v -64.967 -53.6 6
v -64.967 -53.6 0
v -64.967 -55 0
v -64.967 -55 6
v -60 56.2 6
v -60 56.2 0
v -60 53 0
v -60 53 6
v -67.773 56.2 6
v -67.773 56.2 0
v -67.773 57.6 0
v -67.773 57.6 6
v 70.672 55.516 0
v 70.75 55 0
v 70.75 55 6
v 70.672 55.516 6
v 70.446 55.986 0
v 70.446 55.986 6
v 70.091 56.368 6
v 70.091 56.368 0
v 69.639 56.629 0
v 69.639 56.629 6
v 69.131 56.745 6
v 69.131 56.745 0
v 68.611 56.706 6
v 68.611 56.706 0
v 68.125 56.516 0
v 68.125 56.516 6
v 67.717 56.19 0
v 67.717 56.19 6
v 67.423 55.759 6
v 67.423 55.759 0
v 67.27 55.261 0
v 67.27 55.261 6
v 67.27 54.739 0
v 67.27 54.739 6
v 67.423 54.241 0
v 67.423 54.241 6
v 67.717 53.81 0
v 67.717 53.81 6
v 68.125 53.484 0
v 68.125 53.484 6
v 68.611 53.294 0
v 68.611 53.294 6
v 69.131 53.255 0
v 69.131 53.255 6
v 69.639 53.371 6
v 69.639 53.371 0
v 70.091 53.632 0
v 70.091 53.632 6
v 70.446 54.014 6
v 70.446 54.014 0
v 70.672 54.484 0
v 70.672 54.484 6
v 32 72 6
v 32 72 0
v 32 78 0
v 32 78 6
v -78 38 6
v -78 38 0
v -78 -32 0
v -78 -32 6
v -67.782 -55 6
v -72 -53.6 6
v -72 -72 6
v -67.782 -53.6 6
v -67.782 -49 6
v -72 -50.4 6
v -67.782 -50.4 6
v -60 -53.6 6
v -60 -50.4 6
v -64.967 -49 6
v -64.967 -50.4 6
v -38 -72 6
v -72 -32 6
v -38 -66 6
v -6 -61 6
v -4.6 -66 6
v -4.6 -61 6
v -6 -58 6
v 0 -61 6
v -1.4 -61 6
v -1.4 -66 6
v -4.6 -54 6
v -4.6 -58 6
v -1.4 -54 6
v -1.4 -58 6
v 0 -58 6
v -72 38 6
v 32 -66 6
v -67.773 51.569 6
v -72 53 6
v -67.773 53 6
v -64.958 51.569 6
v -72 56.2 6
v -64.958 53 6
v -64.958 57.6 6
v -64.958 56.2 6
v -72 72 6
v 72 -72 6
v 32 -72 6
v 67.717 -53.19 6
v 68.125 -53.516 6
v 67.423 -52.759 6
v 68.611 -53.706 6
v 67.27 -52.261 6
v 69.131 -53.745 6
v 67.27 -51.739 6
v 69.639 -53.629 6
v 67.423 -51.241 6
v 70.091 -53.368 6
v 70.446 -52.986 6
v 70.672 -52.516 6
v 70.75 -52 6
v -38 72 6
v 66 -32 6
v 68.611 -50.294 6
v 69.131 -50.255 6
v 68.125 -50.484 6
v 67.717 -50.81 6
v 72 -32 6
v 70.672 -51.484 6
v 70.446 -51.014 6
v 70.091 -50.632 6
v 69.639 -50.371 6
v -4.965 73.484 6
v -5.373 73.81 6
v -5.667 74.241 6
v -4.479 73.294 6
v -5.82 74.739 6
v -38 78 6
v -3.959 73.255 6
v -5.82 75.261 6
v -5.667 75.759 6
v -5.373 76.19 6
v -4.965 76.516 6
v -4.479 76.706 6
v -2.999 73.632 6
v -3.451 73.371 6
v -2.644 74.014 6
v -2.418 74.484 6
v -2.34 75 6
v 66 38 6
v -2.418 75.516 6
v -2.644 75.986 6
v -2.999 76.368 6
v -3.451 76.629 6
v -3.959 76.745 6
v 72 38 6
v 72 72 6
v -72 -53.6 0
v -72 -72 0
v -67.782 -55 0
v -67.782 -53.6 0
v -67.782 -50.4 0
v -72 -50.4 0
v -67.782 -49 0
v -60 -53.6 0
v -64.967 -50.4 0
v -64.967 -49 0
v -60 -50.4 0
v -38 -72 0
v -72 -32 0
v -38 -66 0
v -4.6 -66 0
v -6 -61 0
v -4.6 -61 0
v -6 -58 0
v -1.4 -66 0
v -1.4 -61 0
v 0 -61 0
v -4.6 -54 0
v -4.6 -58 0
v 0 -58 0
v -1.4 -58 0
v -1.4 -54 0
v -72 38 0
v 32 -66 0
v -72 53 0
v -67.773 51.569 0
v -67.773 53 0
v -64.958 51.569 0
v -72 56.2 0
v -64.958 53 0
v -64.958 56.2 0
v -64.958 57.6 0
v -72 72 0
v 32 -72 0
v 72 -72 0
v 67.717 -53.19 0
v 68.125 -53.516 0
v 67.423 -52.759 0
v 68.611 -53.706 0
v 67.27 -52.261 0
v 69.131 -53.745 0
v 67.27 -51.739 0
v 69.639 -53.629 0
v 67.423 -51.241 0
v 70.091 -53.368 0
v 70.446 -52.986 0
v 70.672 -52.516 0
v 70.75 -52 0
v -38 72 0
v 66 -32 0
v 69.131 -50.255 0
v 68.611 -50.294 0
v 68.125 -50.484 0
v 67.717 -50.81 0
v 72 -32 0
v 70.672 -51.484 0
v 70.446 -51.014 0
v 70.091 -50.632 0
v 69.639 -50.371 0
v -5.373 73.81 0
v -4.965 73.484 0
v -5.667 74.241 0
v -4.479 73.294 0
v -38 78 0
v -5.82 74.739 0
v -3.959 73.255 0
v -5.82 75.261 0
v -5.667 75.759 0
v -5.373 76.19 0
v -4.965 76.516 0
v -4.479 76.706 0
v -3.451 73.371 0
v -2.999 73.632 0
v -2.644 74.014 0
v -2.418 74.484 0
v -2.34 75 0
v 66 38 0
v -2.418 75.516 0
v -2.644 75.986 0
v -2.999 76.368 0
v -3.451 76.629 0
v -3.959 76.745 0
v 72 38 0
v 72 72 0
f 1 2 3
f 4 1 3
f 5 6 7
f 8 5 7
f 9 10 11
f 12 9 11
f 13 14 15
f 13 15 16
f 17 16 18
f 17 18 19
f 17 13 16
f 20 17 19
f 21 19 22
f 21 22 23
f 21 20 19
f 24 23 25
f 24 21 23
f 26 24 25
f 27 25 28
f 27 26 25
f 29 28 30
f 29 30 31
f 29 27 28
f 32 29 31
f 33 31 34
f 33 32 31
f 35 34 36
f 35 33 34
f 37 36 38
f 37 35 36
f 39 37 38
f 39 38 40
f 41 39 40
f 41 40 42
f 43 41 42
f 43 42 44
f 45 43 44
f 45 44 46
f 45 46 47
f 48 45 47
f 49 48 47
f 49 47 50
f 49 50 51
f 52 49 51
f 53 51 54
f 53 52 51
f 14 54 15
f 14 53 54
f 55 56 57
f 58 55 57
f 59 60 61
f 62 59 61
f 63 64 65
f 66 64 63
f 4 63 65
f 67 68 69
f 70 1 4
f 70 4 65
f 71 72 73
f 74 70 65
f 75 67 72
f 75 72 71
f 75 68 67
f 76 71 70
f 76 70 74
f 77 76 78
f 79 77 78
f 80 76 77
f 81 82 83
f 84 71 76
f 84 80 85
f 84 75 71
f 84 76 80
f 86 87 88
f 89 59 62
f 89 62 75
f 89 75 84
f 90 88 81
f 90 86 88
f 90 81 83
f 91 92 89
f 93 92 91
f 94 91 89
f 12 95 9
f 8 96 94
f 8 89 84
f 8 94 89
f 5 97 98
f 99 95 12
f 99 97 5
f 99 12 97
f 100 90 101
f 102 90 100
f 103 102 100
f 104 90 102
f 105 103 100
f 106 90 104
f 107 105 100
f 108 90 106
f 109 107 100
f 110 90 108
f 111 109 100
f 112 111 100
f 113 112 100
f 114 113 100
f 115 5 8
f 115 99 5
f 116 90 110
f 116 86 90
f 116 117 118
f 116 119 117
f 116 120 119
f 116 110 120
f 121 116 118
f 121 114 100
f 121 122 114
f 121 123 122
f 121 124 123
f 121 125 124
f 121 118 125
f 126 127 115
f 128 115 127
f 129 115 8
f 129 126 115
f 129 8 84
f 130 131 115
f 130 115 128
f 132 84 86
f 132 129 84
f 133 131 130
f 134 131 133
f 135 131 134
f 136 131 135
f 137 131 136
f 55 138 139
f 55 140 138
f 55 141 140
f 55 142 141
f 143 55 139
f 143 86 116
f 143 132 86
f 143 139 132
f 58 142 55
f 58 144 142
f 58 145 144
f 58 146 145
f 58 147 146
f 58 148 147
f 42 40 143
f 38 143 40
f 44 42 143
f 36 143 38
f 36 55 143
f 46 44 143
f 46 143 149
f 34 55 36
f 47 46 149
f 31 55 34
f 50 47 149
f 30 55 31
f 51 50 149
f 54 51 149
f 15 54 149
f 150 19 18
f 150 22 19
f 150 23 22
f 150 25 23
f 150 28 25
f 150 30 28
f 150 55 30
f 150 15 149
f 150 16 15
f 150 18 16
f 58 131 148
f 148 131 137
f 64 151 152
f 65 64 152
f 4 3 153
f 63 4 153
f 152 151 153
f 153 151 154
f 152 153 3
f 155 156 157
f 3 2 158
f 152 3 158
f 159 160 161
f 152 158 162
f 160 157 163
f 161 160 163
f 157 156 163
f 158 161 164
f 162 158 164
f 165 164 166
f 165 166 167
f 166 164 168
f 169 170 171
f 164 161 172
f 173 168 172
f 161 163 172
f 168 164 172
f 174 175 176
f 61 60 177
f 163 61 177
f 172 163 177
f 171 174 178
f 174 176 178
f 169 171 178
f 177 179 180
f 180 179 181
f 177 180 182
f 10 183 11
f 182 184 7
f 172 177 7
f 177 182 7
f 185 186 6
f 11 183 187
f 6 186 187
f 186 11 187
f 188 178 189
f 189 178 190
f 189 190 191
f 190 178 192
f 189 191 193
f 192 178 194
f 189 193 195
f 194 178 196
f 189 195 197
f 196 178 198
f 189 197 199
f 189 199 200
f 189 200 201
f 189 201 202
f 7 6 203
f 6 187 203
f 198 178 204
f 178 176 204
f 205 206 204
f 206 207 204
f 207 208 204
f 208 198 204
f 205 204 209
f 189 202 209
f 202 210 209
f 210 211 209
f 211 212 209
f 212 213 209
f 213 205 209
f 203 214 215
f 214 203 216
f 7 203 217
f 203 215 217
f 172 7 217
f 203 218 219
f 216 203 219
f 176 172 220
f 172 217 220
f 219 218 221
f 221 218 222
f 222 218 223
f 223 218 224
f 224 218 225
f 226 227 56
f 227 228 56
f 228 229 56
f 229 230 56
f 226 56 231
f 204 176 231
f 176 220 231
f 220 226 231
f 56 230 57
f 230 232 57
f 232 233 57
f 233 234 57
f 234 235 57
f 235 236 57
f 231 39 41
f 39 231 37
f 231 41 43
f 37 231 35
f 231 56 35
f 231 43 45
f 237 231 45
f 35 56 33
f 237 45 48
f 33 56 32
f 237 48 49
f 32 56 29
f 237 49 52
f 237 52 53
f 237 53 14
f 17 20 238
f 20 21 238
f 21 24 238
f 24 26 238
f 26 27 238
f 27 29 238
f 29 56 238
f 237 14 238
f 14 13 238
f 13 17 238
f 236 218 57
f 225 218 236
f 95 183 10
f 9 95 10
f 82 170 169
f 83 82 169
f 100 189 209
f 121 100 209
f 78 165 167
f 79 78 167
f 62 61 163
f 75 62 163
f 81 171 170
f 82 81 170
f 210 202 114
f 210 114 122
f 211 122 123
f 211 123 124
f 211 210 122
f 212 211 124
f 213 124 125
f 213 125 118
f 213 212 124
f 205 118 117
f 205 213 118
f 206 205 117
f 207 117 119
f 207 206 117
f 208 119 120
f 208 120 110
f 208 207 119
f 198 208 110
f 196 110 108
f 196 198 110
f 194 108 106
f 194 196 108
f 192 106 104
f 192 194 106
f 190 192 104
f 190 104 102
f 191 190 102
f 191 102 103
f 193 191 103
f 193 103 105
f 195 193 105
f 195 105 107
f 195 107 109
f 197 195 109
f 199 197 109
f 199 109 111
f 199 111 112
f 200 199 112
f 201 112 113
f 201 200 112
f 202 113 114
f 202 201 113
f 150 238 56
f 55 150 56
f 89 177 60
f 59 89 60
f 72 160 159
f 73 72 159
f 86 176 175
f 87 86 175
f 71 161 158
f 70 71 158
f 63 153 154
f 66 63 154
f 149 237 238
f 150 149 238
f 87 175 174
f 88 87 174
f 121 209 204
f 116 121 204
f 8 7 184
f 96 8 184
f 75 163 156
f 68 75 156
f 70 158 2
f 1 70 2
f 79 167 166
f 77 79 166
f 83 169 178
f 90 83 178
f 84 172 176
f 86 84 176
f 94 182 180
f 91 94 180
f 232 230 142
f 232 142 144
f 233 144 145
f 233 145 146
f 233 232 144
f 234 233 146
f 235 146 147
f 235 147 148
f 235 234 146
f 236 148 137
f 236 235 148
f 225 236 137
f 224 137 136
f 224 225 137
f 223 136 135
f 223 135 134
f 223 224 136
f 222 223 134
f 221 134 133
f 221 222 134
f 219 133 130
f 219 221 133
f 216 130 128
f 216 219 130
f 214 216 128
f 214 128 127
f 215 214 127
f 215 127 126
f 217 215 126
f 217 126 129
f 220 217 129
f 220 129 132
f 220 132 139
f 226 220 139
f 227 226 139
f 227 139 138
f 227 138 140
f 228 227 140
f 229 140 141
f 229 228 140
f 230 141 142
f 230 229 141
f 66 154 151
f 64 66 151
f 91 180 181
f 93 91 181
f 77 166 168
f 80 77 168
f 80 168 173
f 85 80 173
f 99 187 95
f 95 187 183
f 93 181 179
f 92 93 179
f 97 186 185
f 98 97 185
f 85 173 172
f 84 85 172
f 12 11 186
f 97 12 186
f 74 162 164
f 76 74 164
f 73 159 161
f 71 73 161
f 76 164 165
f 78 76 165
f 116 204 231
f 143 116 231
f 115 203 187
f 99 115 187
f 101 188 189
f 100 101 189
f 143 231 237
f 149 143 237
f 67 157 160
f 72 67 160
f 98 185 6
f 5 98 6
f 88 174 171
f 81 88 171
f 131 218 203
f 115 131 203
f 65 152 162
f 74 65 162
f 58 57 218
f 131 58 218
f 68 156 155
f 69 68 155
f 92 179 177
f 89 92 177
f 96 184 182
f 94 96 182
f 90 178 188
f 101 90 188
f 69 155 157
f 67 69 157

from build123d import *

# Parameters (mm, degrees)
SKETCH1_R           = 1.75
BOSS_EXTRUDE2_DEPTH = 6


with BuildPart() as part:
    # Sketch1 → Boss-Extrude2 (new body)
    with BuildSketch(Plane.XY):
        Polygon((72, 72), (32, 72), (32, 78), (-38, 78), (-38, 72), (-72, 72), (-72, 56.2), (-67.772810154, 56.2), (-67.772810154, 57.6), (-64.957983727, 57.6), (-64.957983727, 56.2), (-60, 56.2), (-60, 53), (-64.957983727, 53), (-64.957983727, 51.568504207), (-67.772810154, 51.568504207), (-67.772810154, 53), (-72, 53), (-72, 38), (-78, 38), (-78, -32), (-72, -32), (-72, -50.4), (-67.78187279, -50.4), (-67.78187279, -49), (-64.967046362, -49), (-64.967046362, -50.4), (-60, -50.4), (-60, -53.6), (-64.967046362, -53.6), (-64.967046362, -55), (-67.78187279, -55), (-67.78187279, -53.6), (-72, -53.6), (-72, -72), (-38, -72), (-38, -66), (-4.6, -66), (-4.6, -61), (-6, -61), (-6, -58), (-4.6, -58), (-4.6, -54), (-1.4, -54), (-1.4, -58), (0, -58), (0, -61), (-1.4, -61), (-1.4, -66), (32, -66), (32, -72), (72, -72), (72, -32), (66, -32), (66, 38), (72, 38), align=None)
        with Locations((69, -52)):
            Circle(SKETCH1_R, mode=Mode.SUBTRACT)
        with Locations((69, 55)):
            Circle(SKETCH1_R, mode=Mode.SUBTRACT)
        with Locations((-4.09, 75)):
            Circle(SKETCH1_R, mode=Mode.SUBTRACT)
    extrude(amount=BOSS_EXTRUDE2_DEPTH)


solid = part.part
